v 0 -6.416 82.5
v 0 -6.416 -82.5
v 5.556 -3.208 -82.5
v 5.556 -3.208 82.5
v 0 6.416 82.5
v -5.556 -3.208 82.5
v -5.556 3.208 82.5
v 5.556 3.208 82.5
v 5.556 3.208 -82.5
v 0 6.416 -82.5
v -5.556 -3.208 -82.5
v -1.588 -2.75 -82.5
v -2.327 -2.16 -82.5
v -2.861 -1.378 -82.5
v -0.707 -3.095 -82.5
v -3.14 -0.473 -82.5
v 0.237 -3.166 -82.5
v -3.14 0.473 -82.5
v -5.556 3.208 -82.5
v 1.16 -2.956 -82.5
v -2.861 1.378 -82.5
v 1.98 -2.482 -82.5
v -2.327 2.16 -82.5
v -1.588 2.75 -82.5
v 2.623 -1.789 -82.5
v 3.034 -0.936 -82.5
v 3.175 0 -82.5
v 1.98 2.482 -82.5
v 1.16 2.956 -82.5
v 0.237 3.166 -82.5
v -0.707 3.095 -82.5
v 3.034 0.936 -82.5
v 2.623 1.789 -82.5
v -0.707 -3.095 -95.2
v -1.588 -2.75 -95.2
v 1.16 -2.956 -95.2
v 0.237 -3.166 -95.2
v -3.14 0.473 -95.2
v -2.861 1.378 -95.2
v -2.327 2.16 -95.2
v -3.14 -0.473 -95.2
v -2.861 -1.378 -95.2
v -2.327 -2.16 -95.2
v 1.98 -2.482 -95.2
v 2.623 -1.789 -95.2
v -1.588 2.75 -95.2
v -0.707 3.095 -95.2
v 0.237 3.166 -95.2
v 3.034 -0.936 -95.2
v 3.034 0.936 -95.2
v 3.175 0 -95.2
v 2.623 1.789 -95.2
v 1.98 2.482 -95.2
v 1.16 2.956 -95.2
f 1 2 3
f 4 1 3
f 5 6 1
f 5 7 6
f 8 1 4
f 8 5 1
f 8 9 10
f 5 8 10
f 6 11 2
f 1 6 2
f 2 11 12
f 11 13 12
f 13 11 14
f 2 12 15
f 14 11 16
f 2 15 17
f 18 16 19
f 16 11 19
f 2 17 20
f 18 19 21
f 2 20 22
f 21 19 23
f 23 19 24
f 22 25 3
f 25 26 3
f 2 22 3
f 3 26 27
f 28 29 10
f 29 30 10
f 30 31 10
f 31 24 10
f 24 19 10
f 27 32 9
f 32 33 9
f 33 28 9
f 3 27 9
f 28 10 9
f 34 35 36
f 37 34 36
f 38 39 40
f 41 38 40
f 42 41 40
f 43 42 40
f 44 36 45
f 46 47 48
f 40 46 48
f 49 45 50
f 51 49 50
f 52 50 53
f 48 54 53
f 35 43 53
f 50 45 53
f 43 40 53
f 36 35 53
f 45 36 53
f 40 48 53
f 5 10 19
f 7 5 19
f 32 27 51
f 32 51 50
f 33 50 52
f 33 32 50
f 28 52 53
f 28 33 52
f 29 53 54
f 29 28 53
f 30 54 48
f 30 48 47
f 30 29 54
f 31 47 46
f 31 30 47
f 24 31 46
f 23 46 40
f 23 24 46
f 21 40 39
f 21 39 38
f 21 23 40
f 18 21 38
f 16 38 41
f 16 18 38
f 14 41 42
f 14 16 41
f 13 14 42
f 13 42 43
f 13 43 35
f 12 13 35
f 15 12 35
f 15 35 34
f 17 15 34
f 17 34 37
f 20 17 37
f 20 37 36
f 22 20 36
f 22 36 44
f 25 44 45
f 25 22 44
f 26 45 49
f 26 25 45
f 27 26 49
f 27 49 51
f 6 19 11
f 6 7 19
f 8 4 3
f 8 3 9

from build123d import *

# Parameters (mm, degrees)
BOSS_EXTRUDE2_DEPTH      = 82.5
BOSS_EXTRUDE2_DEPTH_BACK = 82.5
SKETCH4_R                = 3.175
BOSS_EXTRUDE3_DEPTH      = 12.7


with BuildPart() as part:
    # Sketch3 → Boss-Extrude2 (new body, two sides)
    with BuildSketch(Plane.XY) as boss_extrude2_sk:
        Polygon((-5.55625, -3.207902433), (0, -6.415804866), (5.55625, -3.207902433), (5.55625, 3.207902433), (0, 6.415804866), (-5.55625, 3.207902433), align=None)
    extrude(amount=BOSS_EXTRUDE2_DEPTH)
    extrude(boss_extrude2_sk.sketch, amount=-BOSS_EXTRUDE2_DEPTH_BACK)

    # Sketch4 → Boss-Extrude3 (add)
    with BuildSketch(Plane.XY.offset(-82.5)):
        Circle(SKETCH4_R)
    extrude(amount=-BOSS_EXTRUDE3_DEPTH)


solid = part.part
